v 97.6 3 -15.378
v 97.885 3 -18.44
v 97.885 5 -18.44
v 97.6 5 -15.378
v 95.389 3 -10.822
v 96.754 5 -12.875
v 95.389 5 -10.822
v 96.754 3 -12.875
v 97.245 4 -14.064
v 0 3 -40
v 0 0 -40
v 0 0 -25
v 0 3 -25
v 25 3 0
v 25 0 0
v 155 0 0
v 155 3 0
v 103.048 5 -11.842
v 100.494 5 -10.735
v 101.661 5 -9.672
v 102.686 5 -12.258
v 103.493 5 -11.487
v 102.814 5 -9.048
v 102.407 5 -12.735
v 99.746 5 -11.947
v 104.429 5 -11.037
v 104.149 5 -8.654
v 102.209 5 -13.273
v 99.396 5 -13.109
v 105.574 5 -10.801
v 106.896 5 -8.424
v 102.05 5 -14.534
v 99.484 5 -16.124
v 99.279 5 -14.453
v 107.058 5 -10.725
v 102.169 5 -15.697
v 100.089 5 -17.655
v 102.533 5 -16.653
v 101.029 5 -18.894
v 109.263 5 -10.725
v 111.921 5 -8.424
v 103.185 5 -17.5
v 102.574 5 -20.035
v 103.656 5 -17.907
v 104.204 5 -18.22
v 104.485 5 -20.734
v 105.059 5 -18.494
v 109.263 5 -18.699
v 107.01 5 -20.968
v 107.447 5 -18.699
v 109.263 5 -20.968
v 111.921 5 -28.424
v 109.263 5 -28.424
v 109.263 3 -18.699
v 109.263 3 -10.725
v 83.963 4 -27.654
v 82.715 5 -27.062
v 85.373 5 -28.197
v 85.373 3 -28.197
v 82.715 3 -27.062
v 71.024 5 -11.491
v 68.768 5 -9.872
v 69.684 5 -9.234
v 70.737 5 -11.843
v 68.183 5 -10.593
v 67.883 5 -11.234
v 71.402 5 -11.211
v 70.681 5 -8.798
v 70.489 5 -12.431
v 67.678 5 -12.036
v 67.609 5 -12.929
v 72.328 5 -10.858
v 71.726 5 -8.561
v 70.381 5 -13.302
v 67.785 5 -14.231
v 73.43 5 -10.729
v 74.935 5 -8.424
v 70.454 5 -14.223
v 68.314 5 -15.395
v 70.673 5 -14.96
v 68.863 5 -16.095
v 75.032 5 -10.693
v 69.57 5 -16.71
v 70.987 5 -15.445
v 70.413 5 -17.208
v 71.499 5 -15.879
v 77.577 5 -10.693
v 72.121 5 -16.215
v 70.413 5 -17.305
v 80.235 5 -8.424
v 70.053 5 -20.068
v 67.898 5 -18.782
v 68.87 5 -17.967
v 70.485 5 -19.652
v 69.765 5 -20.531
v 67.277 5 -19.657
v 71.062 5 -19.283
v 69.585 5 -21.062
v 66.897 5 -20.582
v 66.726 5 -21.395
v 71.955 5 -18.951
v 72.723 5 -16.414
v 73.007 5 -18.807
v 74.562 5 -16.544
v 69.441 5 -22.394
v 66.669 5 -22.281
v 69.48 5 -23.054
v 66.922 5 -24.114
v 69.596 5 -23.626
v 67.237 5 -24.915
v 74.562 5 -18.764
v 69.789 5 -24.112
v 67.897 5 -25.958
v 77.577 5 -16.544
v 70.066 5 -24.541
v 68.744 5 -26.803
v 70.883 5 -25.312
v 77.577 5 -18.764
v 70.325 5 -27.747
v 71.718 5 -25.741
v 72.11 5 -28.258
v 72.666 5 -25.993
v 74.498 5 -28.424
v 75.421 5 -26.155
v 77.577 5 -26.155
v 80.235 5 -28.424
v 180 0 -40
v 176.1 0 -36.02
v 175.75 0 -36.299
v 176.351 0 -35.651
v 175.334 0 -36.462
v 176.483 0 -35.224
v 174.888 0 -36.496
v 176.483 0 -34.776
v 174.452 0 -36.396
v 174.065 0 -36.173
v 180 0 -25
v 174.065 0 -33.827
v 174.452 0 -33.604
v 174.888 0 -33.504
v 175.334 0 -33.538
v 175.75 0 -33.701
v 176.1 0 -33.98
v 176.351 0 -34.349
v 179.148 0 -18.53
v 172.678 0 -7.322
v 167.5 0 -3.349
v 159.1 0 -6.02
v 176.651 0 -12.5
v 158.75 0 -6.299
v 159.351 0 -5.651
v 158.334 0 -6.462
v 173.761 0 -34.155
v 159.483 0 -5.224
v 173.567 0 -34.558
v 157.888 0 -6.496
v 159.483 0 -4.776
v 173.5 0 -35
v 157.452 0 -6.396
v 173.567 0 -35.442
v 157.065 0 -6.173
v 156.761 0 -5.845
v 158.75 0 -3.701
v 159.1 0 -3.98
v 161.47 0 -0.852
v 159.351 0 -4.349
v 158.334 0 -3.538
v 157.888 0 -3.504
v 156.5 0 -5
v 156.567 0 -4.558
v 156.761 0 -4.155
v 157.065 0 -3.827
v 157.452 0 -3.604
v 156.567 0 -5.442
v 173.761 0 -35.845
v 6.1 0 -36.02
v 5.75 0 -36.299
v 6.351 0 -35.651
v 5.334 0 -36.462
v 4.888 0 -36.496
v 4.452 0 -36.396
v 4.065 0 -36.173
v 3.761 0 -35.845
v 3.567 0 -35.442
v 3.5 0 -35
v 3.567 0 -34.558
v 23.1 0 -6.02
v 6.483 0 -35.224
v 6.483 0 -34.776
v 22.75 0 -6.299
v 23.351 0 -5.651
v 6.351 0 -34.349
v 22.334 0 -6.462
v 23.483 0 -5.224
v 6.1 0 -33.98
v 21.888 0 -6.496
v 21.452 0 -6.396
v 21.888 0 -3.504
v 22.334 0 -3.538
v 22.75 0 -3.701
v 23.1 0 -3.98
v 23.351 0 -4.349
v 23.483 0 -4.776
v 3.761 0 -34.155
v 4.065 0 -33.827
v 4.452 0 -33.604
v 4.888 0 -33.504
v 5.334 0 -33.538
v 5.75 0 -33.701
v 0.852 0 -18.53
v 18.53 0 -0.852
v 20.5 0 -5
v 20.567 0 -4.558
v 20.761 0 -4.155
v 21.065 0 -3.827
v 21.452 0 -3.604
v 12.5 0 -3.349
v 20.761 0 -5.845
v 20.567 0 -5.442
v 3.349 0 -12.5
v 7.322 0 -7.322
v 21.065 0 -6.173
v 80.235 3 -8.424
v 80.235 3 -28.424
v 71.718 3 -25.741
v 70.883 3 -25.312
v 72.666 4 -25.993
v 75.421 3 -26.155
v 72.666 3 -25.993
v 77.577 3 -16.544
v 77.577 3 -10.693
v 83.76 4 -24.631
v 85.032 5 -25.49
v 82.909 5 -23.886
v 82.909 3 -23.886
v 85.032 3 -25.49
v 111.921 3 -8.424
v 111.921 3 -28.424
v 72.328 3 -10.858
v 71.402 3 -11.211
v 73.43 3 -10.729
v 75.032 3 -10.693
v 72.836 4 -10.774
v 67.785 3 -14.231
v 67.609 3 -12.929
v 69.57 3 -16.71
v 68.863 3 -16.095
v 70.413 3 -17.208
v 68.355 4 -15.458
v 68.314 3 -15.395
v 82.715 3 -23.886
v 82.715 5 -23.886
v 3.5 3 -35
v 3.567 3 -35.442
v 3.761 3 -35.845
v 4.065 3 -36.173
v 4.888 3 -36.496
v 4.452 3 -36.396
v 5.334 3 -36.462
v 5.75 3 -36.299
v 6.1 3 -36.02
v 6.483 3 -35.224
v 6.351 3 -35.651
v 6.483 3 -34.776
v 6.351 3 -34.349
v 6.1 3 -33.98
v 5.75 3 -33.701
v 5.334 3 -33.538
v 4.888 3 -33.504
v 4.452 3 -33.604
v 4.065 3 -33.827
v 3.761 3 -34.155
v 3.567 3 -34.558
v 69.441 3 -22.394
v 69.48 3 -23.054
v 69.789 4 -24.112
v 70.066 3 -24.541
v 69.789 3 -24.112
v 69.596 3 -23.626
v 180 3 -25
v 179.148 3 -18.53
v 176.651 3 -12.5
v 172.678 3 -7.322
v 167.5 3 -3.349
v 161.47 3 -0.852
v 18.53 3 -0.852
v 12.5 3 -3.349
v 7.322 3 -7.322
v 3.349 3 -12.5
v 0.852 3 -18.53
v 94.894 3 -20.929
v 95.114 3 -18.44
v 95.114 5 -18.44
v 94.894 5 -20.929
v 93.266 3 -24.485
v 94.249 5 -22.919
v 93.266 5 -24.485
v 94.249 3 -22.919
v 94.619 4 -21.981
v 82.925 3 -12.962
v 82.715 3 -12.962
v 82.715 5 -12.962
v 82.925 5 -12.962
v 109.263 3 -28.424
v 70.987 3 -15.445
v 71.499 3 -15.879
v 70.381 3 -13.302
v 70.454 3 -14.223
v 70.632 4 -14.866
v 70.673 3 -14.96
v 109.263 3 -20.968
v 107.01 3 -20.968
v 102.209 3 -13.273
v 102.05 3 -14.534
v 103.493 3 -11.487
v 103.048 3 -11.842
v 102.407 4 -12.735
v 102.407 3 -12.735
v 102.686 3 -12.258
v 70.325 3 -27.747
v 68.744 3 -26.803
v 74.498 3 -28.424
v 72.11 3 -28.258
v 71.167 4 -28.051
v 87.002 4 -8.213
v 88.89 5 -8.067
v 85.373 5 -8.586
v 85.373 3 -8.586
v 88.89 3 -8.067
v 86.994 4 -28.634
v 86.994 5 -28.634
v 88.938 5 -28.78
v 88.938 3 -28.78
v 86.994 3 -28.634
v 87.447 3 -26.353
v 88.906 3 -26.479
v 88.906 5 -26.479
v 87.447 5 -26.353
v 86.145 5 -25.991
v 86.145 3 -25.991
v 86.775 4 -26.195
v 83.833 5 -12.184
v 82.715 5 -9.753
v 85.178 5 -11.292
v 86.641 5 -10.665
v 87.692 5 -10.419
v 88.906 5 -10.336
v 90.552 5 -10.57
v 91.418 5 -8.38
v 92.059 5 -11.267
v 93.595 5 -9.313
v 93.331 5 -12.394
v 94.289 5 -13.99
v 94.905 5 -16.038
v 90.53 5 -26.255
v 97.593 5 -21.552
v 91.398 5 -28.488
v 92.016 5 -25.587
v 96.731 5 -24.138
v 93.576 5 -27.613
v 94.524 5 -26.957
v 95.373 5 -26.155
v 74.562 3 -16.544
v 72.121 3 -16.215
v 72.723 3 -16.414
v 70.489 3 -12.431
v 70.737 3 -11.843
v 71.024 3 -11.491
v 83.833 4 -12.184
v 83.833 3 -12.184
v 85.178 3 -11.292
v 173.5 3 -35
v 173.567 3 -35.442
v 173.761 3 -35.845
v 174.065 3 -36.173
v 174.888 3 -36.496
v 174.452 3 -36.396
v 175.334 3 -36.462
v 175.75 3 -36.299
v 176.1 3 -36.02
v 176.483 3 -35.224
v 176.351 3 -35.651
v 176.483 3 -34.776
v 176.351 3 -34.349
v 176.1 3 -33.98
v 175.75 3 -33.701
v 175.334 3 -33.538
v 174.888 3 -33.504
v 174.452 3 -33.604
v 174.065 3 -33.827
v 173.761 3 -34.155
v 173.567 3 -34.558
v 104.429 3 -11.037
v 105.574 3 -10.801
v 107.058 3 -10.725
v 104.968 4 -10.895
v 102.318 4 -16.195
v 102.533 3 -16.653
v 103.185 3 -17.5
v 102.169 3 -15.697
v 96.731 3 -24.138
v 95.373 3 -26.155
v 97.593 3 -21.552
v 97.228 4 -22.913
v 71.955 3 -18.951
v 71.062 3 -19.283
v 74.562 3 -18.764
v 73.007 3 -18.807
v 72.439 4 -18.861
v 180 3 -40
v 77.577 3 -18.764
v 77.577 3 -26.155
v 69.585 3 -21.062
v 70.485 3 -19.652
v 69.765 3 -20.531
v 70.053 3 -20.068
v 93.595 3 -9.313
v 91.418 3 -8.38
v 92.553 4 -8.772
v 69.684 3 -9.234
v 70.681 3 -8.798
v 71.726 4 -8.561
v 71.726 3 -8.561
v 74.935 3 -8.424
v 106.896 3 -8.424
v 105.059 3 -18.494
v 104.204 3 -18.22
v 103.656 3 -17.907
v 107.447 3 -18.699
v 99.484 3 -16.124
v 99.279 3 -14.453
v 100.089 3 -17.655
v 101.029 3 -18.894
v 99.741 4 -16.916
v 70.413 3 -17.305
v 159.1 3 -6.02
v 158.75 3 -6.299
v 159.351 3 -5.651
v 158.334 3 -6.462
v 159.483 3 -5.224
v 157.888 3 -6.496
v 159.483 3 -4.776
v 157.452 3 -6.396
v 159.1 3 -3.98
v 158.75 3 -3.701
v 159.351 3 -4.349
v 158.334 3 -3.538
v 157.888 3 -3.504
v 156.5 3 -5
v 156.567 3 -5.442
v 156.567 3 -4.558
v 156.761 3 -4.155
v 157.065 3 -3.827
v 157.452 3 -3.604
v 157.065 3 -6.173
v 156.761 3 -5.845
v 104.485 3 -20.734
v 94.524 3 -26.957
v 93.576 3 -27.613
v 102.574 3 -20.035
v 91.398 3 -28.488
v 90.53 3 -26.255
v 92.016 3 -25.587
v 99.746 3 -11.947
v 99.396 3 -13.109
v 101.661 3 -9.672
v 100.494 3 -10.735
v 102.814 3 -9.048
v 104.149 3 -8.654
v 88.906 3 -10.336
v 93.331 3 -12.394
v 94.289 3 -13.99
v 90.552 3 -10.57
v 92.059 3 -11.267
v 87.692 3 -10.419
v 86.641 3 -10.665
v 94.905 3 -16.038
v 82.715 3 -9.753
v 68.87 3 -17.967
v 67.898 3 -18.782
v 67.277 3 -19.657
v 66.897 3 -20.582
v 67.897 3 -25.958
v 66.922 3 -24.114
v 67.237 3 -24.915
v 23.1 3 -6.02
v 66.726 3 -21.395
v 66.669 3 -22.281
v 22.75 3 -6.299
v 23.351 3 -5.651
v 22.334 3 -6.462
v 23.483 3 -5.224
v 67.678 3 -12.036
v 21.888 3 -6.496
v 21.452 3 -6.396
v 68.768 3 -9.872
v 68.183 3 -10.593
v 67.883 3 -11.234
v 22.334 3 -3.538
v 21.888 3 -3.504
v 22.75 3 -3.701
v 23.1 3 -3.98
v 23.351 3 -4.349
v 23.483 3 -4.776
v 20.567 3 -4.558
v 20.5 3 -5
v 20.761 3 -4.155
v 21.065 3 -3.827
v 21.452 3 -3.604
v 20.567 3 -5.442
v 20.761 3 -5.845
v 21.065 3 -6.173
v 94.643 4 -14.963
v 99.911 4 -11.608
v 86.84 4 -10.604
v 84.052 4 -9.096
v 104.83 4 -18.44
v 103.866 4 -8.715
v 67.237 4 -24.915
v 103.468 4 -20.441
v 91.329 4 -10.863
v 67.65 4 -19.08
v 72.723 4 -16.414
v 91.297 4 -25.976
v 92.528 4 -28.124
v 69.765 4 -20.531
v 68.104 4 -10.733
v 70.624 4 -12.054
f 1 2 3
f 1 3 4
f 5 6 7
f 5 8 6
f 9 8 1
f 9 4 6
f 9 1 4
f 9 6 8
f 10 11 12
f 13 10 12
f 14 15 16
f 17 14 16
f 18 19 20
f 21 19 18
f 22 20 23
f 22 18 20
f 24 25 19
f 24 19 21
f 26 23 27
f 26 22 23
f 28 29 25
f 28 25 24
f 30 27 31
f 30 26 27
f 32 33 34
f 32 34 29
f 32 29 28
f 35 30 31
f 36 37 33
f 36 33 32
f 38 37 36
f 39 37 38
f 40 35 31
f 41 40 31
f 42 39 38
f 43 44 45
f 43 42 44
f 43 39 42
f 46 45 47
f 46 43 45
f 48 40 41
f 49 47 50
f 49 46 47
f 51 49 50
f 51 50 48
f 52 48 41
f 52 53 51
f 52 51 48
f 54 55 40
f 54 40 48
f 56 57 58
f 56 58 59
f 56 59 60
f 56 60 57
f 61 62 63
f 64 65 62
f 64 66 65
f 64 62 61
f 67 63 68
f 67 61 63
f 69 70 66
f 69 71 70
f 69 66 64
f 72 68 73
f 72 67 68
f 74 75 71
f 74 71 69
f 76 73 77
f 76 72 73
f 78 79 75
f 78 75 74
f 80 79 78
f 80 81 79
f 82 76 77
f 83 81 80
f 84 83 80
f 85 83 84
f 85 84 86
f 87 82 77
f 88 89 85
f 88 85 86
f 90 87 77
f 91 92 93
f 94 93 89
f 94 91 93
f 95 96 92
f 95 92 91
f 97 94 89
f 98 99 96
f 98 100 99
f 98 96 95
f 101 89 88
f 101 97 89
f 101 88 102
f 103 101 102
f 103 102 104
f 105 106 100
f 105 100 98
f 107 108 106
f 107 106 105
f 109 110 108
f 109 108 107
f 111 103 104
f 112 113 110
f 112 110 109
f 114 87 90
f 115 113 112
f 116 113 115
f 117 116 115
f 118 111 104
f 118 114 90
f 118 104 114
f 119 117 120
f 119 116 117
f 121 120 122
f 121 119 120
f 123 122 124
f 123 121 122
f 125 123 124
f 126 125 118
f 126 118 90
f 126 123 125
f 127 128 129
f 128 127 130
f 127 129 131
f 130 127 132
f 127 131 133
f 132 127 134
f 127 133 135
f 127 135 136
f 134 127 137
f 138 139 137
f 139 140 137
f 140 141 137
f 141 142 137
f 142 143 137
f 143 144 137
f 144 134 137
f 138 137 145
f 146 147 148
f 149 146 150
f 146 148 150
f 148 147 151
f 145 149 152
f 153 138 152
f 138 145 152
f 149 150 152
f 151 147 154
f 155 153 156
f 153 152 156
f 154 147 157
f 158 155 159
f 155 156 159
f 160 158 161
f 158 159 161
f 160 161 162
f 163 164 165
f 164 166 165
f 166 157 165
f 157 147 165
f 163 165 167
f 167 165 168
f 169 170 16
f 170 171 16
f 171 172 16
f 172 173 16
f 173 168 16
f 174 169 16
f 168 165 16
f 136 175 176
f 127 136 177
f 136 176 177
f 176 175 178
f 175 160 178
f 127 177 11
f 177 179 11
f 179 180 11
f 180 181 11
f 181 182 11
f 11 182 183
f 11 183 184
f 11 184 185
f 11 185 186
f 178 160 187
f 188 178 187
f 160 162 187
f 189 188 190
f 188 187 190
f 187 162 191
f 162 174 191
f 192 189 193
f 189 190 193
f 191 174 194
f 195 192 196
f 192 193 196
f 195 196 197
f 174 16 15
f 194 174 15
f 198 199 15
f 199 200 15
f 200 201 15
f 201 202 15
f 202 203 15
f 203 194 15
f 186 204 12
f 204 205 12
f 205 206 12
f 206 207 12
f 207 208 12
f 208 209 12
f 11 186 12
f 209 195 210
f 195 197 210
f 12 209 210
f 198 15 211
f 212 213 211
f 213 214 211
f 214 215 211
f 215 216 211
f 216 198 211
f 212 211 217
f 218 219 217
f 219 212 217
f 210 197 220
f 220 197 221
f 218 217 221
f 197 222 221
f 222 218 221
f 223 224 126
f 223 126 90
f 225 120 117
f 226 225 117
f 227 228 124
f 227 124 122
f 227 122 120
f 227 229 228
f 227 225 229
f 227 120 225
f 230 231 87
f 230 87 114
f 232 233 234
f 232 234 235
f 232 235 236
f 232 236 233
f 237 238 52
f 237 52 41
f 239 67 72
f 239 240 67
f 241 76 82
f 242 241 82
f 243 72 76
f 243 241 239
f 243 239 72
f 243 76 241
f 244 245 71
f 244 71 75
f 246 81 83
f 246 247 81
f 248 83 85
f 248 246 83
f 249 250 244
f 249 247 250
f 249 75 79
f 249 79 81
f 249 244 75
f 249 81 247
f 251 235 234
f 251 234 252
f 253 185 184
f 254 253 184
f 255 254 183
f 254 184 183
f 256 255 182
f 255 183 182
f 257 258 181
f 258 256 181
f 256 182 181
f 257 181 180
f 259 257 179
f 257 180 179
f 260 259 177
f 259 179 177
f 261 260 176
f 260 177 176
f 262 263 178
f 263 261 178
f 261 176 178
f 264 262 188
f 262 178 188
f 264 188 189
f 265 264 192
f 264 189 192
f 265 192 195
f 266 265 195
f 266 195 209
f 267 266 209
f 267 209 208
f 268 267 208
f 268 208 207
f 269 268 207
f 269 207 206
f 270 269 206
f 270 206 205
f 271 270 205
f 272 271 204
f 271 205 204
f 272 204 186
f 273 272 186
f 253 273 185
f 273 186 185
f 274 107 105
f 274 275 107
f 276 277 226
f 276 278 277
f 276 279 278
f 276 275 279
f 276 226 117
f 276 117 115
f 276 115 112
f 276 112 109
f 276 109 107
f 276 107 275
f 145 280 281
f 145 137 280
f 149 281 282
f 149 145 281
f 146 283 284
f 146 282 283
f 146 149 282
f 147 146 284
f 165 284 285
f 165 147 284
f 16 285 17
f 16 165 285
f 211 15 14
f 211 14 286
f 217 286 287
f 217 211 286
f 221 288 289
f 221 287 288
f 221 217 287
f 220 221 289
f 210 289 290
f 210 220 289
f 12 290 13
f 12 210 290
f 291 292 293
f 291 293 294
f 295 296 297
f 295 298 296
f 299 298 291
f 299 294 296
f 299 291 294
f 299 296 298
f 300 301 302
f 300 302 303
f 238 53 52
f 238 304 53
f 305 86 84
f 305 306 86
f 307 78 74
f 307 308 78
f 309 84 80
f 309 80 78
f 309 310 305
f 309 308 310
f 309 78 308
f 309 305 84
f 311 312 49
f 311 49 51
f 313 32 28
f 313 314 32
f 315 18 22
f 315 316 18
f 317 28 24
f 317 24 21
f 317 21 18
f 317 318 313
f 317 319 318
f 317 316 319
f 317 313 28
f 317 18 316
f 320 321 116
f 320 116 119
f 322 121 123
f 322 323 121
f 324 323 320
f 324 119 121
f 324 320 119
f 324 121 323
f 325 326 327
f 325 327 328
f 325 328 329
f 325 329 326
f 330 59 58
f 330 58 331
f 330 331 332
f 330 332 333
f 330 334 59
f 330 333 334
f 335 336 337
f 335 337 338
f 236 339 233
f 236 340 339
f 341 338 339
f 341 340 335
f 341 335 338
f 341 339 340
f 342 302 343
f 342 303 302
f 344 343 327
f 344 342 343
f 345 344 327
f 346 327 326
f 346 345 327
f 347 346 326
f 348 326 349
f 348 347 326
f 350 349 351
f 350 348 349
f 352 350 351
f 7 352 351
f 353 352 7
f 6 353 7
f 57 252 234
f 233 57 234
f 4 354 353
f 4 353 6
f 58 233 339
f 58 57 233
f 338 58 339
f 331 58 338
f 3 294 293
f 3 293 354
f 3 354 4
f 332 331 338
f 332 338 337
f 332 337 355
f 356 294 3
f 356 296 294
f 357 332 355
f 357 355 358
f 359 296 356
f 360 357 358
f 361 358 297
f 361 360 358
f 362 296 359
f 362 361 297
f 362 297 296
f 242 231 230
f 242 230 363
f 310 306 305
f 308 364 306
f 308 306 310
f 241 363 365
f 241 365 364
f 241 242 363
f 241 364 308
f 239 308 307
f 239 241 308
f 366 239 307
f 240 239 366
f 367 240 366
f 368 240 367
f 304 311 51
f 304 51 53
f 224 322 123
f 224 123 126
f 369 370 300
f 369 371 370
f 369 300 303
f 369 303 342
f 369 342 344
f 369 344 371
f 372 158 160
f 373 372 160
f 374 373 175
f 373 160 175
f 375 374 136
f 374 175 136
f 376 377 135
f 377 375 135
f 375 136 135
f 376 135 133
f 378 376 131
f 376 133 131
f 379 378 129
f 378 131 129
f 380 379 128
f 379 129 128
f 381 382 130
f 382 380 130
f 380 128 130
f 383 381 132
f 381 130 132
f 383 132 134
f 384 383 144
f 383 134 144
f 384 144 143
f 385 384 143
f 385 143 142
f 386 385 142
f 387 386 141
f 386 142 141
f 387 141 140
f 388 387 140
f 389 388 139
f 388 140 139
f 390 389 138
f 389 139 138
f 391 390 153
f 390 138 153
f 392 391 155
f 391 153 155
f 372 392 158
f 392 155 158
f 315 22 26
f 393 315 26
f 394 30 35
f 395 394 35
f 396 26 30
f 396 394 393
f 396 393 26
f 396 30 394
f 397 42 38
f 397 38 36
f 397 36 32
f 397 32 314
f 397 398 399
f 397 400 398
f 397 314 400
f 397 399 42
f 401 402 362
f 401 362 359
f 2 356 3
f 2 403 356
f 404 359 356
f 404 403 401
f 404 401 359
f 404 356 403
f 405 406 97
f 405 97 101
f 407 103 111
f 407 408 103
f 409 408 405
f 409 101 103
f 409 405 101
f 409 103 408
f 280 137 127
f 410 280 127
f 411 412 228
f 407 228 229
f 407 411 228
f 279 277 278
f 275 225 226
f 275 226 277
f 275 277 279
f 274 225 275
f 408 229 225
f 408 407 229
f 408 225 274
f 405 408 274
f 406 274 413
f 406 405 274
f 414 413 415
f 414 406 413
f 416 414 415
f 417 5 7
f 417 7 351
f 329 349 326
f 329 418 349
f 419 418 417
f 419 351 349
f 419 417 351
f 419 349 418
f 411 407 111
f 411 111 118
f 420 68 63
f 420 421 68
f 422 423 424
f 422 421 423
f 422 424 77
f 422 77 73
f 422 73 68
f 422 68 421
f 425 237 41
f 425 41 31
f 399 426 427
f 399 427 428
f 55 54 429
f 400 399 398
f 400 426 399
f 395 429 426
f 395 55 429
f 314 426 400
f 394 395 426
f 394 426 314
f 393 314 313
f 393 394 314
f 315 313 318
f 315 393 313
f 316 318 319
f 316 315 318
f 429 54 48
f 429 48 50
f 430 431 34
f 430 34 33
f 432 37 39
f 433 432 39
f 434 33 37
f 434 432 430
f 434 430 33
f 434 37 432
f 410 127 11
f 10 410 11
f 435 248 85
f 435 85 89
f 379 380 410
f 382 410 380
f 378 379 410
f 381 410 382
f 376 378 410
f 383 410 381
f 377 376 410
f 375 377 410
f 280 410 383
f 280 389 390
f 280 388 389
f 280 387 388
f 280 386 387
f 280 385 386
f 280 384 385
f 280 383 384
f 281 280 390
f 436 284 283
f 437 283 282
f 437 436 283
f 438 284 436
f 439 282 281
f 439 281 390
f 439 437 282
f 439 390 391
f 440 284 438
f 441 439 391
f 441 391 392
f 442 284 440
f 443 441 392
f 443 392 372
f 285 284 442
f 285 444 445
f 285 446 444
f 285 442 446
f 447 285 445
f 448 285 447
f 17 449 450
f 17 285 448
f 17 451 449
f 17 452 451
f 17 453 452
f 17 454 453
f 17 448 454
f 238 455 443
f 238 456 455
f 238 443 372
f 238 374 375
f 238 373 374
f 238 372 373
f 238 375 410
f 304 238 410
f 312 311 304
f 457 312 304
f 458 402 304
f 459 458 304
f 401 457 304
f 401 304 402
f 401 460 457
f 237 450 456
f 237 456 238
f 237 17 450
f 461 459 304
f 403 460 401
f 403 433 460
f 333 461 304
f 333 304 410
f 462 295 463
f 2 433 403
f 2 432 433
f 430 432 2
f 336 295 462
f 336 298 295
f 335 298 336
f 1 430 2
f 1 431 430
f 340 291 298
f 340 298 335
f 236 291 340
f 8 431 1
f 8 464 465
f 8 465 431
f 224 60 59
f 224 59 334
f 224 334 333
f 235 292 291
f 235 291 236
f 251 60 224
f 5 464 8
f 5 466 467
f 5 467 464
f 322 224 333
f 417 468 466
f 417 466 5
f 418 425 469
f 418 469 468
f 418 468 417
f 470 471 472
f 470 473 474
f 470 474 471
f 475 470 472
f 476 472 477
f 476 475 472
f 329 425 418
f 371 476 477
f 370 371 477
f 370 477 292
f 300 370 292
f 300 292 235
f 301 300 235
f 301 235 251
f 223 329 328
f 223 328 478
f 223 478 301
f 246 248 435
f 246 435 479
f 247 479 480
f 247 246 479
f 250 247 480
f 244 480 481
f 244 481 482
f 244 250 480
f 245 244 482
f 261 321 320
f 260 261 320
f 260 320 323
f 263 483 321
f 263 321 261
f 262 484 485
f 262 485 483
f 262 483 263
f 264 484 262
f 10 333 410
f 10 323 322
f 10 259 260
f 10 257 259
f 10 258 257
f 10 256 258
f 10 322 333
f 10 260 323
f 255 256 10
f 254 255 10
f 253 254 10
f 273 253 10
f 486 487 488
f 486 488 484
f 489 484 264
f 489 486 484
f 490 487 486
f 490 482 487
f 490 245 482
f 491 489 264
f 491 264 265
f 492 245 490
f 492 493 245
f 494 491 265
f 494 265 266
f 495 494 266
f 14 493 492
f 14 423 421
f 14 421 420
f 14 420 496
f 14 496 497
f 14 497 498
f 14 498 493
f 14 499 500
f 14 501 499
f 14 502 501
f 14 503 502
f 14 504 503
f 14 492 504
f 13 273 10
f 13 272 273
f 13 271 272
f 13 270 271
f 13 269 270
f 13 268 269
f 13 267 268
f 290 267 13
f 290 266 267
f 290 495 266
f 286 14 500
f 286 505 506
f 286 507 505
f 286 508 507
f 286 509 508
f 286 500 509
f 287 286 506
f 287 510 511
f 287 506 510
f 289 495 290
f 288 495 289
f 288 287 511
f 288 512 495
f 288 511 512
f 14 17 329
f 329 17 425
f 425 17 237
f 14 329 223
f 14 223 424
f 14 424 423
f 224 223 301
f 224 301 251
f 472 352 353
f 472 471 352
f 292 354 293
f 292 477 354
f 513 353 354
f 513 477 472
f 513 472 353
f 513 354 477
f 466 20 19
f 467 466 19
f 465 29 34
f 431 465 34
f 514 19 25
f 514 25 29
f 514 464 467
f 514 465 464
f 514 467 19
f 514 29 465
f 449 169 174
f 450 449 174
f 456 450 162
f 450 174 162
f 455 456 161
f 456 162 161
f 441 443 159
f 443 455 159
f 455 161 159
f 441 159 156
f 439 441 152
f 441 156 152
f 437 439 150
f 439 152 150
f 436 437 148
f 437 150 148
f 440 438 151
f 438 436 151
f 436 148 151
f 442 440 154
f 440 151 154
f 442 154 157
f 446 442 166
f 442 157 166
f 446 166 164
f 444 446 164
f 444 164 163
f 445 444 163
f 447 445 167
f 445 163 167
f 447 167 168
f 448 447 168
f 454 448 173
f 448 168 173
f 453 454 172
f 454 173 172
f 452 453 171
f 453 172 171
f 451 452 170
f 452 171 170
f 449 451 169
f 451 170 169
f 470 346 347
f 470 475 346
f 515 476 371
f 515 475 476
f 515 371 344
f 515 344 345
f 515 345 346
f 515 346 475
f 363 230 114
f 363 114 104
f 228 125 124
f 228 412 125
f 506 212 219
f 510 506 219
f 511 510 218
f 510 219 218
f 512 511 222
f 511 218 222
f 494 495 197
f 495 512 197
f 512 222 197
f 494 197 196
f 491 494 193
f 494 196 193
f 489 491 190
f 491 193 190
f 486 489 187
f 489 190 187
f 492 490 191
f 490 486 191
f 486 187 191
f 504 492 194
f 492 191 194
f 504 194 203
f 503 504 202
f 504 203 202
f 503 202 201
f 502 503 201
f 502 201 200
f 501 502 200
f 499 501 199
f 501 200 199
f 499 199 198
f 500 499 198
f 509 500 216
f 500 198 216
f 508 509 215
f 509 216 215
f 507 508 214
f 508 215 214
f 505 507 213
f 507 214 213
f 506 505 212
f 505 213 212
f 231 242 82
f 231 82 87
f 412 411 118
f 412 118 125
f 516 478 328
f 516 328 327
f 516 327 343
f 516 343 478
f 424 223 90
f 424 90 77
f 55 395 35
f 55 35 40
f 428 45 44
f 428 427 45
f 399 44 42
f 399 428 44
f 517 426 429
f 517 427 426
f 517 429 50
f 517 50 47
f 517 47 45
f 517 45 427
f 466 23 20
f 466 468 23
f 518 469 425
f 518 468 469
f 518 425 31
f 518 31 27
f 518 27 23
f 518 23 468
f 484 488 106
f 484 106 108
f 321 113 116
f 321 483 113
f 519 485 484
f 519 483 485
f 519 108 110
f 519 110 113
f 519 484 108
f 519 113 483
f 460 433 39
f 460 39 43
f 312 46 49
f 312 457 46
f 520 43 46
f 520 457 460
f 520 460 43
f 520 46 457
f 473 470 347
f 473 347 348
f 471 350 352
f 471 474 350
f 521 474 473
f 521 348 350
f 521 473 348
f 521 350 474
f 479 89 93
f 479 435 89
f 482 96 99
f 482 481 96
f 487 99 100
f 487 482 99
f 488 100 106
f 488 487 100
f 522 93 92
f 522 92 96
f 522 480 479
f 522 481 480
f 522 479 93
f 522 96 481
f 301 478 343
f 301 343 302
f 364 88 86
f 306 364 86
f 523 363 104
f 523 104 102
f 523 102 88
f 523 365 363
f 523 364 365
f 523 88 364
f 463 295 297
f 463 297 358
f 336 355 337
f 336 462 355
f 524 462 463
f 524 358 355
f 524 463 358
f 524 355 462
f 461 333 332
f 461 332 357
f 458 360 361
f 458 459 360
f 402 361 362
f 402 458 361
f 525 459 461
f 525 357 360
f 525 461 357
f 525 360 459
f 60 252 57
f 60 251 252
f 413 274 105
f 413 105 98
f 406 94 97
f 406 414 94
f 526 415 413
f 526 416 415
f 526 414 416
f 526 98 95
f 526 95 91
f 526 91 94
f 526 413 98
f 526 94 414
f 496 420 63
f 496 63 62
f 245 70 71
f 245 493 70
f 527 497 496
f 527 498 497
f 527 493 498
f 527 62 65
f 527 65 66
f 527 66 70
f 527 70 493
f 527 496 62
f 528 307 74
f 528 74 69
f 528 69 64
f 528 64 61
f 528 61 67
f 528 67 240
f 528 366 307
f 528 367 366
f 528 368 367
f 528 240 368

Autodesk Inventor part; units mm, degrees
ref_plane "YZ Plane" through (0, 0, 0) normal (1, 0, 0) x (0, 1, 0)
ref_plane "XZ Plane" through (0, 0, 0) normal (0, 1, 0) x (-1, 0, 0)
ref_plane "XY Plane" through (0, 0, 0) normal (0, 0, 1) x (1, 0, 0)
sketch "스케치1" plane through (0, 0, 0) normal (0, 1, 0) x (-1, 0, 0)
  line L0 (-25, 0) -> (-155, 0)
  line L1 (-180, -25) -> (-180, -40)
  line L2 (-180, -40) -> (0, -40)
  line L3 (0, -40) -> (0, -25)
  arc A0 (0, -25) -> (-25, 0) centre (-25, -25) ccw
  arc A1 (-155, 0) -> (-180, -25) centre (-155, -25) ccw
  circle A2 centre (-5, -35) radius 1.5
  circle A3 centre (-5, -35) radius 2.5
  circle A4 centre (-5, -22) radius 1.5
  circle A5 centre (-5, -22) radius 2.5
  circle A6 centre (-22, -5) radius 1.5
  circle A7 centre (-22, -5) radius 2.5
  line L4 (-90, -40) -> (-90, 0)
  circle A8 centre (-90, -35) radius 2.5
  circle A9 centre (-90, -5) radius 2.5
  circle A10 centre (-47.5, -35) radius 2.5
  circle A11 centre (-175, -35) radius 1.5
  circle A12 centre (-175, -35) radius 2.5
  circle A13 centre (-175, -22) radius 1.5
  circle A14 centre (-175, -22) radius 2.5
  circle A15 centre (-158, -5) radius 1.5
  circle A16 centre (-158, -5) radius 2.5
  circle A17 centre (-132.5, -35) radius 2.5
  point P0 (0, 0)
  point P1 (-180, 0)
  dimension "d0" = 180
  dimension "d1" = 40
  dimension "d2" = 25
  dimension "d3" = 3
  dimension "d4" = 5
  dimension "d5" = 3
  dimension "d6" = 5
  dimension "d7" = 3
  dimension "d8" = 5
  dimension "d9" = 5
  dimension "d10" = 5
  dimension "d11" = 5
  dimension "d12" = 5
  dimension "d13" = 5
  dimension "d14" = 5
  dimension "d15" = 5
  dimension "d16" = 5
  dimension "d17" = 5
  dimension "d18" = 85
  dimension "d19" = 42.5
  dimension "d20" = 3
  dimension "d21" = 3
extrude "돌출1" add sketch "스케치1" along normal blind 3 contours A0 L3 L2 L4 A8 A9 L0 | L4 A9 A8 L2 L1 A1 L0 | A9 L4 | L4 A9 | A8 L4 | L4 A8 | A3 | A4 | A5 | A7 | A10 | A12 | A13 | A14 | A16 | A17
sketch "스케치2" plane through (0, 3, 0) normal (0, 1, 0) x (1, 0, 0)
  line L0 (113.9465, 8.0671) -> (66.0535, 8.0671) construction
  line L1 (66.0535, 8.0671) -> (66.0535, 31.9329) construction
  line L2 (66.0535, 31.9329) -> (113.9465, 31.9329) construction
  line L3 (113.9465, 31.9329) -> (113.9465, 8.0671) construction
  line L4 (0, 40) -> (0, 25) projected
  line L5 (180, 40) -> (0, 40) projected
  spline S0 degree 2 poles (99.2788, 14.4529) (99.2788, 15.7494) (100.2026, 18.0833) (101.0292, 18.8937) knots 0 0 0 1 2 2 2
  spline S1 degree 2 poles (101.0292, 18.8937) (102.0664, 19.9148) (104.8703, 20.9682) (107.0097, 20.9682) knots 0 0 0 1 2 2 2
  line L6 (107.0097, 20.9682) -> (109.2626, 20.9682)
  line L7 (109.2626, 20.9682) -> (109.2626, 28.4237)
  line L8 (109.2626, 28.4237) -> (111.9206, 28.4237)
  line L9 (111.9206, 28.4237) -> (111.9206, 8.4237)
  line L10 (111.9206, 8.4237) -> (106.8963, 8.4237)
  spline S2 degree 2 poles (106.8963, 8.4237) (105.1135, 8.4237) (102.6175, 9.0071) (101.6613, 9.6717) knots 0 0 0 1 2 2 2
  spline S3 degree 2 poles (101.6613, 9.6717) (100.5429, 10.4334) (99.2788, 12.7835) (99.2788, 14.4529) knots 0 0 0 1 2 2 2
  spline S4 degree 2 poles (102.0502, 14.5339) (102.0502, 13.4966) (102.7634, 11.9731) (103.4927, 11.4869) knots 0 0 0 1 2 2 2
  spline S5 degree 2 poles (103.4927, 11.4869) (104.1248, 11.0655) (105.8104, 10.7251) (107.0583, 10.7251) knots 0 0 0 1 2 2 2
  line L11 (107.0583, 10.7251) -> (109.2626, 10.7251)
  line L12 (109.2626, 10.7251) -> (109.2626, 18.6992)
  line L13 (109.2626, 18.6992) -> (107.4473, 18.6992)
  spline S6 degree 2 poles (107.4473, 18.6992) (105.8266, 18.6992) (103.8331, 18.1806) (103.1848, 17.4999) knots 0 0 0 1 2 2 2
  spline S7 degree 2 poles (103.1848, 17.4999) (102.5851, 16.9002) (102.0502, 15.4901) (102.0502, 14.5339) knots 0 0 0 1 2 2 2
  spline S8 degree 2 poles (88.9384, 28.7802) (90.8833, 28.7802) (94.1734, 27.4674) (95.3728, 26.1546) knots 0 0 0 1 2 2 2
  spline S9 degree 2 poles (95.3728, 26.1546) (96.5721, 24.858) (97.8849, 20.9682) (97.8849, 18.4399) knots 0 0 0 1 2 2 2
  spline S10 degree 2 poles (97.8849, 18.4399) (97.8849, 15.9277) (96.6045, 12.2) (95.389, 10.8224) knots 0 0 0 1 2 2 2
  spline S11 degree 2 poles (95.389, 10.8224) (94.1896, 9.4772) (90.9157, 8.0671) (88.8898, 8.0671) knots 0 0 0 1 2 2 2
  spline S12 degree 2 poles (88.8898, 8.0671) (87.8849, 8.0671) (86.1183, 8.3588) (85.3728, 8.5858) knots 0 0 0 1 2 2 2
  spline S13 degree 2 poles (85.3728, 8.5858) (84.7245, 8.7964) (83.3793, 9.3961) (82.7147, 9.7527) knots 0 0 0 1 2 2 2
  line L14 (82.7147, 9.7527) -> (82.7147, 12.9618)
  line L15 (82.7147, 12.9618) -> (82.9254, 12.9618)
  spline S14 degree 2 poles (82.9254, 12.9618) (83.282, 12.6376) (84.3841, 11.73) (85.1783, 11.2924) knots 0 0 0 1 2 2 2
  spline S15 degree 2 poles (85.1783, 11.2924) (85.94, 10.871) (87.7391, 10.3362) (88.906, 10.3362) knots 0 0 0 1 2 2 2
  spline S16 degree 2 poles (88.906, 10.3362) (90.1864, 10.3362) (92.4716, 11.3896) (93.3306, 12.3945) knots 0 0 0 1 2 2 2
  spline S17 degree 2 poles (93.3306, 12.3945) (94.1734, 13.4156) (95.1135, 16.5112) (95.1135, 18.4399) knots 0 0 0 1 2 2 2
  spline S18 degree 2 poles (95.1135, 18.4399) (95.1135, 20.4982) (94.1248, 23.4642) (93.2658, 24.4853) knots 0 0 0 1 2 2 2
  spline S19 degree 2 poles (93.2658, 24.4853) (92.423, 25.4739) (90.1702, 26.4788) (88.906, 26.4788) knots 0 0 0 1 2 2 2
  spline S20 degree 2 poles (88.906, 26.4788) (87.7553, 26.4788) (85.7942, 25.9115) (85.0324, 25.4901) knots 0 0 0 1 2 2 2
  spline S21 degree 2 poles (85.0324, 25.4901) (84.3031, 25.0687) (83.2172, 24.1935) (82.9092, 23.8856) knots 0 0 0 1 2 2 2
  line L16 (82.9092, 23.8856) -> (82.7147, 23.8856)
  line L17 (82.7147, 23.8856) -> (82.7147, 27.0623)
  spline S22 degree 2 poles (82.7147, 27.0623) (83.3793, 27.3702) (84.5462, 27.9375) (85.3728, 28.1968) knots 0 0 0 1 2 2 2
  spline S23 degree 2 poles (85.3728, 28.1968) (86.248, 28.4885) (87.7391, 28.7802) (88.9384, 28.7802) knots 0 0 0 1 2 2 2
  spline S24 degree 2 poles (66.6694, 22.2811) (66.6694, 23.7721) (67.8039, 26.0574) (68.7439, 26.8029) knots 0 0 0 1 2 2 2
  spline S25 degree 2 poles (68.7439, 26.8029) (69.8784, 27.6781) (72.4554, 28.4237) (74.4976, 28.4237) knots 0 0 0 1 2 2 2
  line L18 (74.4976, 28.4237) -> (80.235, 28.4237)
  line L19 (80.235, 28.4237) -> (80.235, 8.4237)
  line L20 (80.235, 8.4237) -> (74.9352, 8.4237)
  spline S26 degree 2 poles (74.9352, 8.4237) (72.7958, 8.4237) (70.6564, 8.6992) (69.684, 9.234) knots 0 0 0 1 2 2 2
  spline S27 degree 2 poles (69.684, 9.234) (68.5981, 9.8013) (67.6094, 11.6652) (67.6094, 12.9293) knots 0 0 0 1 2 2 2
  spline S28 degree 2 poles (67.6094, 12.9293) (67.6094, 14.3394) (69.1005, 16.576) (70.4133, 17.2081) knots 0 0 0 1 2 2 2
  line L21 (70.4133, 17.2081) -> (70.4133, 17.3054)
  spline S29 degree 2 poles (70.4133, 17.3054) (68.6305, 17.7916) (66.6694, 20.3686) (66.6694, 22.2811) knots 0 0 0 1 2 2 2
  spline S30 degree 2 poles (69.4408, 22.3945) (69.4408, 21.26) (70.0891, 19.8013) (71.0616, 19.2827) knots 0 0 0 1 2 2 2
  spline S31 degree 2 poles (71.0616, 19.2827) (71.6937, 18.9585) (73.1848, 18.764) (74.5624, 18.764) knots 0 0 0 1 2 2 2
  line L22 (74.5624, 18.764) -> (77.577, 18.764)
  line L23 (77.577, 18.764) -> (77.577, 26.1546)
  line L24 (77.577, 26.1546) -> (75.4214, 26.1546)
  spline S32 degree 2 poles (75.4214, 26.1546) (73.671, 26.1546) (71.6613, 25.8305) (70.8833, 25.3118) knots 0 0 0 1 2 2 2
  spline S33 degree 2 poles (70.8833, 25.3118) (70.1378, 24.777) (69.4408, 23.448) (69.4408, 22.3945) knots 0 0 0 1 2 2 2
  spline S34 degree 2 poles (70.3809, 13.3021) (70.3809, 12.589) (70.8671, 11.5193) (71.4019, 11.2114) knots 0 0 0 1 2 2 2
  spline S35 degree 2 poles (71.4019, 11.2114) (72.0502, 10.8548) (73.6224, 10.6927) (75.0324, 10.6927) knots 0 0 0 1 2 2 2
  line L25 (75.0324, 10.6927) -> (77.577, 10.6927)
  line L26 (77.577, 10.6927) -> (77.577, 16.5436)
  line L27 (77.577, 16.5436) -> (74.5624, 16.5436)
  spline S36 degree 2 poles (74.5624, 16.5436) (73.3144, 16.5436) (72.1313, 16.2843) (71.4992, 15.8791) knots 0 0 0 1 2 2 2
  spline S37 degree 2 poles (71.4992, 15.8791) (70.8833, 15.4901) (70.3809, 14.2422) (70.3809, 13.3021) knots 0 0 0 1 2 2 2
  point P0 (0, 0)
  point P1 (90, 8.0671)
  point P2 (66.0535, 20)
  dimension "d24" = 90
  dimension "d25" = 20
extrude "돌출2" add sketch "스케치2" along normal blind 2
properties part number "pcb"
